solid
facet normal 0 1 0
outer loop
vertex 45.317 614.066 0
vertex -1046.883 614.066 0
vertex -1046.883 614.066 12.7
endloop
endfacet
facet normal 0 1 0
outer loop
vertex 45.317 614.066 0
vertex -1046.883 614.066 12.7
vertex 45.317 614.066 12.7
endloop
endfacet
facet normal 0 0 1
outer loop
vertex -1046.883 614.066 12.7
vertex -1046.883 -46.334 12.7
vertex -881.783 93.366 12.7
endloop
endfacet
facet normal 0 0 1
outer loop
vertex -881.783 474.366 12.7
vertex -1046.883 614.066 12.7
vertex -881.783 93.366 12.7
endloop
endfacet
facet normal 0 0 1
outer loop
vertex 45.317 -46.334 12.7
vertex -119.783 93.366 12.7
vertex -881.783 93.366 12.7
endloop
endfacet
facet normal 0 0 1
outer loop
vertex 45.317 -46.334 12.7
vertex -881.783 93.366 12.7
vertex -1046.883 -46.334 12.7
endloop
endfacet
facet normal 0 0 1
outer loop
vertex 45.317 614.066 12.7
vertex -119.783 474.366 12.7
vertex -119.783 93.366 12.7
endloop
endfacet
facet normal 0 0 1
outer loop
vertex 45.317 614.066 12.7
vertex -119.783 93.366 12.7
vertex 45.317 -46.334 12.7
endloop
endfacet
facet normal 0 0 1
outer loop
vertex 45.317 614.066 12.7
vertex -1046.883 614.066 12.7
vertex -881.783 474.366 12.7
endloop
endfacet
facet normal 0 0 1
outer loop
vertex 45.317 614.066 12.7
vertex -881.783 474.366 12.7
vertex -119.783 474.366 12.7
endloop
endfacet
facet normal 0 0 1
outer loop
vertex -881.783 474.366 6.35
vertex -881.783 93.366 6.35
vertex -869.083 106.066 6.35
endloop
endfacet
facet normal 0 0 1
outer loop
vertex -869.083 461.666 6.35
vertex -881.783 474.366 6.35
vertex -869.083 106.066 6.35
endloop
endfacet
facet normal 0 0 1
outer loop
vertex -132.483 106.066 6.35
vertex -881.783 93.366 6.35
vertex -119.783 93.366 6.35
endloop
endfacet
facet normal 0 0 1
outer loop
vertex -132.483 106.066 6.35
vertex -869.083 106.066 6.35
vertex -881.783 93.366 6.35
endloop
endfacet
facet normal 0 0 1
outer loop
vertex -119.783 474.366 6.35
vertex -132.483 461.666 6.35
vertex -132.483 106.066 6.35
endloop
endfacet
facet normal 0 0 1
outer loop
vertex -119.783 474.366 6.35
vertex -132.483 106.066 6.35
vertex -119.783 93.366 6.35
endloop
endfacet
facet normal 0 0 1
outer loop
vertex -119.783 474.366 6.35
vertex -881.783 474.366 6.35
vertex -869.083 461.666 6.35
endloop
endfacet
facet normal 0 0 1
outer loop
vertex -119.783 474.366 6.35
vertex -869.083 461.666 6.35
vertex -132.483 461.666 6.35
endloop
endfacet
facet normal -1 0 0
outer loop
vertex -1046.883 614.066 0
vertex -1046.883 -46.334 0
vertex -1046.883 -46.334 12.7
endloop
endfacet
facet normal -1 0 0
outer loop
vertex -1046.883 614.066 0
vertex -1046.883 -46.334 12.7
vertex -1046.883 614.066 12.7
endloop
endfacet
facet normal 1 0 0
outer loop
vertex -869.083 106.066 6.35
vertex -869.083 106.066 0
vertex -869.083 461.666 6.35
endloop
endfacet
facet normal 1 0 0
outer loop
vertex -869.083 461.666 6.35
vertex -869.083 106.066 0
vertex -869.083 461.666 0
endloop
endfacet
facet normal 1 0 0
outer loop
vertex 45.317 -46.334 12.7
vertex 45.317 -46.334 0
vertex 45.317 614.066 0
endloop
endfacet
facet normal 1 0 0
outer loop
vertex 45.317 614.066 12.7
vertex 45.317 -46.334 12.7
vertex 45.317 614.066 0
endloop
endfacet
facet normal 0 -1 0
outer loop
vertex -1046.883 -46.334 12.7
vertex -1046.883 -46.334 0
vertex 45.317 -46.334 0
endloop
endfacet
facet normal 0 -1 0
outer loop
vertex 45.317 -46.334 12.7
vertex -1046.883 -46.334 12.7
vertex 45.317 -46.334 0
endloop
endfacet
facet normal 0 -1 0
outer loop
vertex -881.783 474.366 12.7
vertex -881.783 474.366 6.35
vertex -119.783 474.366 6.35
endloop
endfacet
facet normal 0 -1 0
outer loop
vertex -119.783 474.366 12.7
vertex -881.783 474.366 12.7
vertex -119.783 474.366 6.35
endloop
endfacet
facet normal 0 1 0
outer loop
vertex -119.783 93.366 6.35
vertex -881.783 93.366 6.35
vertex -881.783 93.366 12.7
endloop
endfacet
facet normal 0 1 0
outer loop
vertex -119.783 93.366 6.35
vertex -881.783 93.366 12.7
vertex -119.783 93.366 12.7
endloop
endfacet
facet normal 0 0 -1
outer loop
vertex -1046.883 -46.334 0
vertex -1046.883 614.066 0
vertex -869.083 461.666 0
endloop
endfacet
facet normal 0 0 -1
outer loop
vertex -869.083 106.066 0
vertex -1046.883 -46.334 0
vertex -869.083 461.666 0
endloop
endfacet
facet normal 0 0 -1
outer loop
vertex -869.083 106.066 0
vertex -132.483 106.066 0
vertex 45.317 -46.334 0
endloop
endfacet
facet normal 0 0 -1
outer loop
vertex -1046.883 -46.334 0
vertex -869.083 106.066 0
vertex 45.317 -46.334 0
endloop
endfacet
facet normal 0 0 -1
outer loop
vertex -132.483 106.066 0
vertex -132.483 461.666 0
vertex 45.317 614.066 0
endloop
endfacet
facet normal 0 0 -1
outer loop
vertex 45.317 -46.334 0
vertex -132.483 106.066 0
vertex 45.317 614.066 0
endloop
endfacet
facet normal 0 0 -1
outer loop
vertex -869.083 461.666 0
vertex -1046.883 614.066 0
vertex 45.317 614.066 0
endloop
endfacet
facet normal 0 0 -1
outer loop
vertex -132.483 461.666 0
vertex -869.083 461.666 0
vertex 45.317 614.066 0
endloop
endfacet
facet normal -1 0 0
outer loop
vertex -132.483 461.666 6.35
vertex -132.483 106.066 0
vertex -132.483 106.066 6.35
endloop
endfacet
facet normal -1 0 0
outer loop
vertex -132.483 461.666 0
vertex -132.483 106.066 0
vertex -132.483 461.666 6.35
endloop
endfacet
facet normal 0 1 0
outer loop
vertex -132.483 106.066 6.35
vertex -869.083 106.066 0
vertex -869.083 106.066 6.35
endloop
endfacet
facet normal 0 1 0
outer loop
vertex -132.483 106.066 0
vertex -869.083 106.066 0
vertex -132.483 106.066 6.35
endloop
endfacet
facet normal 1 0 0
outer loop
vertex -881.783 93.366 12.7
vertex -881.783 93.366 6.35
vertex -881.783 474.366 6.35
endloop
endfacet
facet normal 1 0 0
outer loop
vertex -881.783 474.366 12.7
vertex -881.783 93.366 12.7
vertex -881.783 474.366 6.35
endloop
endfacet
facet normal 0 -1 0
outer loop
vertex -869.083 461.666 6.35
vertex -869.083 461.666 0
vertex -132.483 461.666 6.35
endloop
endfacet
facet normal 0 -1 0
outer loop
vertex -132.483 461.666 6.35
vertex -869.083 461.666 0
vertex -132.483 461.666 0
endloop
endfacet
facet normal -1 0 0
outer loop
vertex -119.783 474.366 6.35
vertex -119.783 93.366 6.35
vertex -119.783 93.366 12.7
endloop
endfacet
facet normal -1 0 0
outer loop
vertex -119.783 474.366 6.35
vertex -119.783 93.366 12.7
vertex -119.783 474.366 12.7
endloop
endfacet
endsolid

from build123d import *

# Parameters (mm, degrees)
F0_W     = 1092.2
F0_H     = 660.4
F0_W_2   = 762
F0_H_2   = 381
F0_W_3   = 736.6
F0_H_3   = 355.6
F1_DEPTH = 6.35
F2_DEPTH = 12.7


with BuildPart() as f1:
    # F0 (on Top) → F1 (new body)
    with BuildSketch(Plane.XY):
        with Locations((-500.782648, 283.866385)):
            Rectangle(F0_W, F0_H)
        with Locations((-500.782648, 283.866385)):
            Rectangle(F0_W_2, F0_H_2, mode=Mode.SUBTRACT)
        with Locations((-500.782648, 283.866385)):
            Rectangle(F0_W_2, F0_H_2)
        with Locations((-500.782648, 283.866385)):
            Rectangle(F0_W_3, F0_H_3, mode=Mode.SUBTRACT)
    extrude(amount=F1_DEPTH)

    # F0 (on Top) → F2 (join)
    with BuildSketch(Plane.XY):
        with Locations((-500.782648, 283.866385)):
            Rectangle(F0_W, F0_H)
        with Locations((-500.782648, 283.866385)):
            Rectangle(F0_W_2, F0_H_2, mode=Mode.SUBTRACT)
    extrude(amount=F2_DEPTH)


solid = f1.part
